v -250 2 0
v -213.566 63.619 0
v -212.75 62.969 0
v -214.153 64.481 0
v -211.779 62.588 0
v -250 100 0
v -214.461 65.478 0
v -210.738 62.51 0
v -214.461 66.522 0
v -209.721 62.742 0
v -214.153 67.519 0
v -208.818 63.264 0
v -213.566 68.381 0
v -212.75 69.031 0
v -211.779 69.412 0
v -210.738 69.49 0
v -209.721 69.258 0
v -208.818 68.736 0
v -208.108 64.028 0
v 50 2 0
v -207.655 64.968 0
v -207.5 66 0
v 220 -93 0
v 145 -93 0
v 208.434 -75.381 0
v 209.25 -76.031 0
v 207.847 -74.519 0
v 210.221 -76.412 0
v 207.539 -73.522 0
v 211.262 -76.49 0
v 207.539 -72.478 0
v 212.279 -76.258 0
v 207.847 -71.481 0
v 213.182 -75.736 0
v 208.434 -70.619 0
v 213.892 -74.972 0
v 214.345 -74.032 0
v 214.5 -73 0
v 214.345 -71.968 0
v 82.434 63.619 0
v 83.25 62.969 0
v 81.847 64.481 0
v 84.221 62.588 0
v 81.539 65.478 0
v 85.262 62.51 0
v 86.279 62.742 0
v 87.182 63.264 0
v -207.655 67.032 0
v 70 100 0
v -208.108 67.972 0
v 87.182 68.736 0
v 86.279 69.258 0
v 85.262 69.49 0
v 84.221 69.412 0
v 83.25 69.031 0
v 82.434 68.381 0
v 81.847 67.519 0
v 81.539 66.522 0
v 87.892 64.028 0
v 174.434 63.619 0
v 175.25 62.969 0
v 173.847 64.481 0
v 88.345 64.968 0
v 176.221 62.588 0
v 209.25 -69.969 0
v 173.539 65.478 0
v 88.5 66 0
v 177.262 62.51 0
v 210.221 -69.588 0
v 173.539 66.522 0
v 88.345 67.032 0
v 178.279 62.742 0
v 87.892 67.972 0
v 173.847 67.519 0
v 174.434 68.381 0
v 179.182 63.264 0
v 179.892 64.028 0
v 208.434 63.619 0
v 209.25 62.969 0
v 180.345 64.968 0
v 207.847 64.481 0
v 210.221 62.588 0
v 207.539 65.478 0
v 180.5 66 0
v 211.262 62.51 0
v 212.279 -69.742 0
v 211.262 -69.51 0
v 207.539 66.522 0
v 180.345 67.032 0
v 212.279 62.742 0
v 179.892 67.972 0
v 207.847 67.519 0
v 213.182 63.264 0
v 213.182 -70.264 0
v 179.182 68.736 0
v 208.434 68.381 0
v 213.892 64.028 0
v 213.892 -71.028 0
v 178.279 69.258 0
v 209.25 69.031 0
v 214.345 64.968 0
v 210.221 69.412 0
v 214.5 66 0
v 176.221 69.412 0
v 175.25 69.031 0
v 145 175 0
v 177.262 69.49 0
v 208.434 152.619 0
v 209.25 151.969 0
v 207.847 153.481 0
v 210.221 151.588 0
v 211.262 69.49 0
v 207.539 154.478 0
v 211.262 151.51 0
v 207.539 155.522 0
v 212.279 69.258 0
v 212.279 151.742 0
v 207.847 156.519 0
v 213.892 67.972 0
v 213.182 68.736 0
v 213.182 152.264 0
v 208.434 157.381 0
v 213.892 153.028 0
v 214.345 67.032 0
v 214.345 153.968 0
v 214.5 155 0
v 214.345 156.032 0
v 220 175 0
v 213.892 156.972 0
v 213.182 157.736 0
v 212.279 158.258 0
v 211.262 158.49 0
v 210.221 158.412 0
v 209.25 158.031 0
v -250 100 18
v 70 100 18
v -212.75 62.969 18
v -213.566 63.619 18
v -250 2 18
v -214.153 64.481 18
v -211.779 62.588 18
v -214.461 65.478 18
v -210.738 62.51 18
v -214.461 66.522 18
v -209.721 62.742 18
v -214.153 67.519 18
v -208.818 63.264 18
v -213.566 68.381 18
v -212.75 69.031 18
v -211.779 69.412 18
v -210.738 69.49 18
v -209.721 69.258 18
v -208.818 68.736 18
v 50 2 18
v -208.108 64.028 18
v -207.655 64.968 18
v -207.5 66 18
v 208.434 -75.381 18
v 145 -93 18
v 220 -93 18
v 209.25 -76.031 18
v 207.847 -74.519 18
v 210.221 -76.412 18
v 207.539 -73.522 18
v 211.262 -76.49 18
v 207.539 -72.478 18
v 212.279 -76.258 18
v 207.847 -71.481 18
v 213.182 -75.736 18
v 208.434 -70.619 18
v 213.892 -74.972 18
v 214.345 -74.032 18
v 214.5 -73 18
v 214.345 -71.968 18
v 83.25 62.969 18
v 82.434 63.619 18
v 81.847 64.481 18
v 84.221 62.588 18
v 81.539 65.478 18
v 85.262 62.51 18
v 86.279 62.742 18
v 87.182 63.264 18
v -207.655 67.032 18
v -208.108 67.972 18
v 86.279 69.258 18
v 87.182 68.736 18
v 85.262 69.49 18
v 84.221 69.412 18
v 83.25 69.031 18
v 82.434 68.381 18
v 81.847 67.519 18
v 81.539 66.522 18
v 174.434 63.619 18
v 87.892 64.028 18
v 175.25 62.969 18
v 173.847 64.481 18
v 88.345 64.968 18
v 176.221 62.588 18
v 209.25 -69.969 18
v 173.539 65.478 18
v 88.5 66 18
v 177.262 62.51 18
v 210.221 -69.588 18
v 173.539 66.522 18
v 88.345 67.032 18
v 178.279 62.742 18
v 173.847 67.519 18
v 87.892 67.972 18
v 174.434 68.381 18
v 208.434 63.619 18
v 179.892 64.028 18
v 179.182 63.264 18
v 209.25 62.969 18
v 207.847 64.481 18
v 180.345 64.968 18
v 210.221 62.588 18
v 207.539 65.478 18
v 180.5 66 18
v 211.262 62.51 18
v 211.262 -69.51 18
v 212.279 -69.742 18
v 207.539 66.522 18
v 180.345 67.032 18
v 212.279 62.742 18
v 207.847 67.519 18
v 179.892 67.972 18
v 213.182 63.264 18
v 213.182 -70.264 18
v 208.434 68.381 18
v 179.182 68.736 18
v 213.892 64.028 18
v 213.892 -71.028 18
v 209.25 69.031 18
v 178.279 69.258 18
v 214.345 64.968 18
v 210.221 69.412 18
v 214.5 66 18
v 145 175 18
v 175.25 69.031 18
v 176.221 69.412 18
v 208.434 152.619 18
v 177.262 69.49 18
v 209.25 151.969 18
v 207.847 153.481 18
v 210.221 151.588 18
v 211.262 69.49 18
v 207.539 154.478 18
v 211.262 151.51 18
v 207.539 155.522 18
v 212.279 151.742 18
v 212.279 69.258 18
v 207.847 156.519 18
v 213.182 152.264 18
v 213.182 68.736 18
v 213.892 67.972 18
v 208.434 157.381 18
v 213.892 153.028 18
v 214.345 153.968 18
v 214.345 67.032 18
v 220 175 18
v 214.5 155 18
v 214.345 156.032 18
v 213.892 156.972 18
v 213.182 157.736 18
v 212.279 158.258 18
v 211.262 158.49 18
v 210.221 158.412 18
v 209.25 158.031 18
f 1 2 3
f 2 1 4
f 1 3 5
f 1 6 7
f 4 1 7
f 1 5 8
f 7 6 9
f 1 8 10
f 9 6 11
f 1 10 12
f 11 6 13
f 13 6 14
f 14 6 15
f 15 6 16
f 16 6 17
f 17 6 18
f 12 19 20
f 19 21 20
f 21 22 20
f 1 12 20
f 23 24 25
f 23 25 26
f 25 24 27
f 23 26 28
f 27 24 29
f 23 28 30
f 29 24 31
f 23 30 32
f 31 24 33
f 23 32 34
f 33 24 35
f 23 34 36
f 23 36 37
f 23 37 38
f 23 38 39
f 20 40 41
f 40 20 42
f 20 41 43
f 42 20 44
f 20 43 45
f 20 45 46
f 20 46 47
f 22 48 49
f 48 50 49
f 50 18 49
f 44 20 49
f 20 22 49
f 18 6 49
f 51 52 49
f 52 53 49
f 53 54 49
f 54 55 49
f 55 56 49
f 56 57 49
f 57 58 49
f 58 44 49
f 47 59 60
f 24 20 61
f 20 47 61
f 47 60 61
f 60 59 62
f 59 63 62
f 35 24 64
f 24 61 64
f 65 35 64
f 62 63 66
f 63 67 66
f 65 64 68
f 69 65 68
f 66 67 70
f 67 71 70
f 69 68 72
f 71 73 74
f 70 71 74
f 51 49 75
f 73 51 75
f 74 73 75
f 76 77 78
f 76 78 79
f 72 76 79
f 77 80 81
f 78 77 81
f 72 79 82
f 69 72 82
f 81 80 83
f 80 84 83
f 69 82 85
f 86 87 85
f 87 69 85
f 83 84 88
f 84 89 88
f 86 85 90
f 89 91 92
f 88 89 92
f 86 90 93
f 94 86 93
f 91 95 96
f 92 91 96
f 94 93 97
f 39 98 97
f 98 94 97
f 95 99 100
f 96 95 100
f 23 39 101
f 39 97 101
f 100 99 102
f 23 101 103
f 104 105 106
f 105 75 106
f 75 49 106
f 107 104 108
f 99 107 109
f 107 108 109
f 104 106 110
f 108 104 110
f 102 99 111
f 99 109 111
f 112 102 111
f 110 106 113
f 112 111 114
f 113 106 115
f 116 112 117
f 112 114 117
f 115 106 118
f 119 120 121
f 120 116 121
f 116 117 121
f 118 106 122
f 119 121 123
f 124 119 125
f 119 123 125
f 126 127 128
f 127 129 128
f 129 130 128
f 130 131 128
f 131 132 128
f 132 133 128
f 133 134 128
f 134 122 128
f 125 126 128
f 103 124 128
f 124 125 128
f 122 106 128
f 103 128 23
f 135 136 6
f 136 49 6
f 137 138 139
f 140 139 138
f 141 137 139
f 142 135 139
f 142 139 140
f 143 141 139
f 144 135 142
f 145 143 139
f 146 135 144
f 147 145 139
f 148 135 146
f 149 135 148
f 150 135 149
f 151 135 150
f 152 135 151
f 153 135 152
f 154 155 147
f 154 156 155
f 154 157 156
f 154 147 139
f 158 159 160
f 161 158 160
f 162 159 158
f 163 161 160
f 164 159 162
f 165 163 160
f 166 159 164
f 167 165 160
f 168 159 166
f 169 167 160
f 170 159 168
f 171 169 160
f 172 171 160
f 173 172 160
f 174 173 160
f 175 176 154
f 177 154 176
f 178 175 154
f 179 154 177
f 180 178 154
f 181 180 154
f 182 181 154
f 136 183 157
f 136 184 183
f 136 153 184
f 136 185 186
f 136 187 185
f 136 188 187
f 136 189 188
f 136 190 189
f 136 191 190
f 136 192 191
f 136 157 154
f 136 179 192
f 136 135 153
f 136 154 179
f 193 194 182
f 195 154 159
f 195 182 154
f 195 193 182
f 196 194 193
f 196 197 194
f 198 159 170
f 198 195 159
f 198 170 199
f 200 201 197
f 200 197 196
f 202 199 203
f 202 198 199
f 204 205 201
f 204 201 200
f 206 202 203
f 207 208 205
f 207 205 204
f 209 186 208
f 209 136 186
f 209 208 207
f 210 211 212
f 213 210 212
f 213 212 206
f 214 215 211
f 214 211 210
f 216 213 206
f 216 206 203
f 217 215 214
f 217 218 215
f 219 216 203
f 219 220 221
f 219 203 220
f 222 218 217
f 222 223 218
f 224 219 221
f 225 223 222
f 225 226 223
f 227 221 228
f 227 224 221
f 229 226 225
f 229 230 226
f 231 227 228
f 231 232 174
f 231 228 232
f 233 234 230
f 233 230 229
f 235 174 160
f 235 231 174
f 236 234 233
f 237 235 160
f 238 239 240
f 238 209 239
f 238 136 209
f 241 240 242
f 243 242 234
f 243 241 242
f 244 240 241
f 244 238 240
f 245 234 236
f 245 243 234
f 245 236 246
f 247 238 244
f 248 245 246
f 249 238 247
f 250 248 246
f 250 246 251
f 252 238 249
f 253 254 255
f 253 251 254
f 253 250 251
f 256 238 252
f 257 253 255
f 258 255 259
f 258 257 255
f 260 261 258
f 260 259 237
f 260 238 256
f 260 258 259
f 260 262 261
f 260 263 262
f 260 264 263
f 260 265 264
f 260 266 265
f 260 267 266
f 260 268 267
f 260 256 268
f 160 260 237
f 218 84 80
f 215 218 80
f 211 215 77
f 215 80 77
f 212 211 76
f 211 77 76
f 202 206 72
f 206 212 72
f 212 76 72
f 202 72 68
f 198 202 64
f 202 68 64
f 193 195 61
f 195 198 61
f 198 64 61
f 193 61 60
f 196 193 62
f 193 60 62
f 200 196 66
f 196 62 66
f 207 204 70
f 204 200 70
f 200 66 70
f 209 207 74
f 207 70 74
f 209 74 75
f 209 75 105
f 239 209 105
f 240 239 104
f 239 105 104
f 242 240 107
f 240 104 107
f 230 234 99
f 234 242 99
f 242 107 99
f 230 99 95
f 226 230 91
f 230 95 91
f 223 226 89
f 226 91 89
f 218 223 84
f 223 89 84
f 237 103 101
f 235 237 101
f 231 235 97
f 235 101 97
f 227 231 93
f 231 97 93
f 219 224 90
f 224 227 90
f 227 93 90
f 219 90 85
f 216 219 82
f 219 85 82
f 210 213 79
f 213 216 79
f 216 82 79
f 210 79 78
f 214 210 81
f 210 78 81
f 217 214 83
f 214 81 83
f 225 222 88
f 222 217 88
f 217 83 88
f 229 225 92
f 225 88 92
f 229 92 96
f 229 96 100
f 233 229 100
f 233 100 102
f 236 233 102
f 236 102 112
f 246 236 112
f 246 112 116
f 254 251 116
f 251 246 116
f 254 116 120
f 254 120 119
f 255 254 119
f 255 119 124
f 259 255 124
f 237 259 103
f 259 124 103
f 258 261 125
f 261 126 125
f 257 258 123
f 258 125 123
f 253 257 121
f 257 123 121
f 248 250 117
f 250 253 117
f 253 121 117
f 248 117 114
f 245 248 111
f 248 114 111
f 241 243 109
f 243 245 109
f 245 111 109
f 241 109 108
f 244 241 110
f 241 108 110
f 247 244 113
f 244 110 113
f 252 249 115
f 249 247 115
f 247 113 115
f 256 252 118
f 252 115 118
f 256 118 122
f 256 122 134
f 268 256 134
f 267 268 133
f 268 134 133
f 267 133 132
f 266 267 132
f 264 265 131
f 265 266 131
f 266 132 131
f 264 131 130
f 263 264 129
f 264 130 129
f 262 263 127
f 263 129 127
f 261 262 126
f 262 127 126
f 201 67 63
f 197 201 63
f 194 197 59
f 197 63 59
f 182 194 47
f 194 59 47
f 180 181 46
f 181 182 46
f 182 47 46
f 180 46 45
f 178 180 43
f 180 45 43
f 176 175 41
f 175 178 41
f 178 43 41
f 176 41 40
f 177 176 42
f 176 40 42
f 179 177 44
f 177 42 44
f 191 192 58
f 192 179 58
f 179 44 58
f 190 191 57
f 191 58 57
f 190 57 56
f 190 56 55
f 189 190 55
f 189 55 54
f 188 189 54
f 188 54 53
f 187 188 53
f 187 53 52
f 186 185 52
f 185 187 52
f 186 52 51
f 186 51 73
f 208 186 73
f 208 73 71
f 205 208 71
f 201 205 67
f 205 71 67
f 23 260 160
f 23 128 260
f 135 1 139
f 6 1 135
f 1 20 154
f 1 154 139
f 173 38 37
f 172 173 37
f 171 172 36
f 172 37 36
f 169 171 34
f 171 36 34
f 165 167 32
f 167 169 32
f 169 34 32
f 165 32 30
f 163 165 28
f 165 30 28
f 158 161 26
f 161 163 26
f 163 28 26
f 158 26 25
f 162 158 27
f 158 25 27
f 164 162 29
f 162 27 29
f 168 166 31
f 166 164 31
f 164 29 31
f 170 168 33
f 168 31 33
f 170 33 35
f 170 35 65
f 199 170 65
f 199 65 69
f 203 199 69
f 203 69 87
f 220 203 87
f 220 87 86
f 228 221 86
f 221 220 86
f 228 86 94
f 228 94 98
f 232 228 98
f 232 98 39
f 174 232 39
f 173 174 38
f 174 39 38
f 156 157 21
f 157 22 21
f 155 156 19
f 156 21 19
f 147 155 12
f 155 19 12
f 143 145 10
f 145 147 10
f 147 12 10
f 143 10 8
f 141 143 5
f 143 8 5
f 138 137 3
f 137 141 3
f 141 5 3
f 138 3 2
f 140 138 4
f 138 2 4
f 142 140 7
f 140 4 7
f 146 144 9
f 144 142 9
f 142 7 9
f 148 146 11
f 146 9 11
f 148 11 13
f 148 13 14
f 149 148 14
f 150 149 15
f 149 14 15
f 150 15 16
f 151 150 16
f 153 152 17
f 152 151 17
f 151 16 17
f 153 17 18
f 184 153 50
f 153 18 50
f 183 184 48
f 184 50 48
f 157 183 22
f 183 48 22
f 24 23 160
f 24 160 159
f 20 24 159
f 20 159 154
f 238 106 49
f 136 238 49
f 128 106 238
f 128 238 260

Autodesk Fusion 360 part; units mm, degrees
sketch "Top" plane through (0, 0, 0) normal (0, 0, 1) x (1, 0, 0)
  line L0 (145, 175) -> (220, 175)
  line L1 (220, 175) -> (220, -93)
  line L2 (220, -93) -> (145, -93)
  line L3 (-250, 2) -> (-250, 100)
  line L4 (145, 175) -> (70, 100)
  line L5 (145, -93) -> (50, 2)
  line L6 (70, 100) -> (-250, 100)
  line L7 (50, 2) -> (-250, 2)
  line L8 (211, 175) -> (211, -93) construction
  line L9 (220, 66) -> (-250, 66) construction
  circle A0 centre (211, 66) radius 3.5
  circle A1 centre (211, 155) radius 3.5
  circle A2 centre (211, -73) radius 3.5
  circle A3 centre (85, 66) radius 3.5
  circle A4 centre (-211, 66) radius 3.5
  circle A5 centre (177, 66) radius 3.5
  dimension "d3" = 75
  dimension "d4" = 75
  dimension "d5" = 95
  dimension "d6" = 95
  dimension "d7" = 268
  dimension "d8" = 470
  dimension "d9" = 75
  dimension "d10" = 9
  dimension "d11" = 34
  dimension "d12" = 7
  dimension "d13" = 7
  dimension "d14" = 7
  dimension "d15" = 89
  dimension "d16" = 139
  dimension "d17" = 7
  dimension "d18" = 7
  dimension "d19" = 7
  dimension "d20" = 34
  dimension "d21" = 92
  dimension "d22" = 296
extrude "Extrude1" add sketch "Top" along normal blind 18
